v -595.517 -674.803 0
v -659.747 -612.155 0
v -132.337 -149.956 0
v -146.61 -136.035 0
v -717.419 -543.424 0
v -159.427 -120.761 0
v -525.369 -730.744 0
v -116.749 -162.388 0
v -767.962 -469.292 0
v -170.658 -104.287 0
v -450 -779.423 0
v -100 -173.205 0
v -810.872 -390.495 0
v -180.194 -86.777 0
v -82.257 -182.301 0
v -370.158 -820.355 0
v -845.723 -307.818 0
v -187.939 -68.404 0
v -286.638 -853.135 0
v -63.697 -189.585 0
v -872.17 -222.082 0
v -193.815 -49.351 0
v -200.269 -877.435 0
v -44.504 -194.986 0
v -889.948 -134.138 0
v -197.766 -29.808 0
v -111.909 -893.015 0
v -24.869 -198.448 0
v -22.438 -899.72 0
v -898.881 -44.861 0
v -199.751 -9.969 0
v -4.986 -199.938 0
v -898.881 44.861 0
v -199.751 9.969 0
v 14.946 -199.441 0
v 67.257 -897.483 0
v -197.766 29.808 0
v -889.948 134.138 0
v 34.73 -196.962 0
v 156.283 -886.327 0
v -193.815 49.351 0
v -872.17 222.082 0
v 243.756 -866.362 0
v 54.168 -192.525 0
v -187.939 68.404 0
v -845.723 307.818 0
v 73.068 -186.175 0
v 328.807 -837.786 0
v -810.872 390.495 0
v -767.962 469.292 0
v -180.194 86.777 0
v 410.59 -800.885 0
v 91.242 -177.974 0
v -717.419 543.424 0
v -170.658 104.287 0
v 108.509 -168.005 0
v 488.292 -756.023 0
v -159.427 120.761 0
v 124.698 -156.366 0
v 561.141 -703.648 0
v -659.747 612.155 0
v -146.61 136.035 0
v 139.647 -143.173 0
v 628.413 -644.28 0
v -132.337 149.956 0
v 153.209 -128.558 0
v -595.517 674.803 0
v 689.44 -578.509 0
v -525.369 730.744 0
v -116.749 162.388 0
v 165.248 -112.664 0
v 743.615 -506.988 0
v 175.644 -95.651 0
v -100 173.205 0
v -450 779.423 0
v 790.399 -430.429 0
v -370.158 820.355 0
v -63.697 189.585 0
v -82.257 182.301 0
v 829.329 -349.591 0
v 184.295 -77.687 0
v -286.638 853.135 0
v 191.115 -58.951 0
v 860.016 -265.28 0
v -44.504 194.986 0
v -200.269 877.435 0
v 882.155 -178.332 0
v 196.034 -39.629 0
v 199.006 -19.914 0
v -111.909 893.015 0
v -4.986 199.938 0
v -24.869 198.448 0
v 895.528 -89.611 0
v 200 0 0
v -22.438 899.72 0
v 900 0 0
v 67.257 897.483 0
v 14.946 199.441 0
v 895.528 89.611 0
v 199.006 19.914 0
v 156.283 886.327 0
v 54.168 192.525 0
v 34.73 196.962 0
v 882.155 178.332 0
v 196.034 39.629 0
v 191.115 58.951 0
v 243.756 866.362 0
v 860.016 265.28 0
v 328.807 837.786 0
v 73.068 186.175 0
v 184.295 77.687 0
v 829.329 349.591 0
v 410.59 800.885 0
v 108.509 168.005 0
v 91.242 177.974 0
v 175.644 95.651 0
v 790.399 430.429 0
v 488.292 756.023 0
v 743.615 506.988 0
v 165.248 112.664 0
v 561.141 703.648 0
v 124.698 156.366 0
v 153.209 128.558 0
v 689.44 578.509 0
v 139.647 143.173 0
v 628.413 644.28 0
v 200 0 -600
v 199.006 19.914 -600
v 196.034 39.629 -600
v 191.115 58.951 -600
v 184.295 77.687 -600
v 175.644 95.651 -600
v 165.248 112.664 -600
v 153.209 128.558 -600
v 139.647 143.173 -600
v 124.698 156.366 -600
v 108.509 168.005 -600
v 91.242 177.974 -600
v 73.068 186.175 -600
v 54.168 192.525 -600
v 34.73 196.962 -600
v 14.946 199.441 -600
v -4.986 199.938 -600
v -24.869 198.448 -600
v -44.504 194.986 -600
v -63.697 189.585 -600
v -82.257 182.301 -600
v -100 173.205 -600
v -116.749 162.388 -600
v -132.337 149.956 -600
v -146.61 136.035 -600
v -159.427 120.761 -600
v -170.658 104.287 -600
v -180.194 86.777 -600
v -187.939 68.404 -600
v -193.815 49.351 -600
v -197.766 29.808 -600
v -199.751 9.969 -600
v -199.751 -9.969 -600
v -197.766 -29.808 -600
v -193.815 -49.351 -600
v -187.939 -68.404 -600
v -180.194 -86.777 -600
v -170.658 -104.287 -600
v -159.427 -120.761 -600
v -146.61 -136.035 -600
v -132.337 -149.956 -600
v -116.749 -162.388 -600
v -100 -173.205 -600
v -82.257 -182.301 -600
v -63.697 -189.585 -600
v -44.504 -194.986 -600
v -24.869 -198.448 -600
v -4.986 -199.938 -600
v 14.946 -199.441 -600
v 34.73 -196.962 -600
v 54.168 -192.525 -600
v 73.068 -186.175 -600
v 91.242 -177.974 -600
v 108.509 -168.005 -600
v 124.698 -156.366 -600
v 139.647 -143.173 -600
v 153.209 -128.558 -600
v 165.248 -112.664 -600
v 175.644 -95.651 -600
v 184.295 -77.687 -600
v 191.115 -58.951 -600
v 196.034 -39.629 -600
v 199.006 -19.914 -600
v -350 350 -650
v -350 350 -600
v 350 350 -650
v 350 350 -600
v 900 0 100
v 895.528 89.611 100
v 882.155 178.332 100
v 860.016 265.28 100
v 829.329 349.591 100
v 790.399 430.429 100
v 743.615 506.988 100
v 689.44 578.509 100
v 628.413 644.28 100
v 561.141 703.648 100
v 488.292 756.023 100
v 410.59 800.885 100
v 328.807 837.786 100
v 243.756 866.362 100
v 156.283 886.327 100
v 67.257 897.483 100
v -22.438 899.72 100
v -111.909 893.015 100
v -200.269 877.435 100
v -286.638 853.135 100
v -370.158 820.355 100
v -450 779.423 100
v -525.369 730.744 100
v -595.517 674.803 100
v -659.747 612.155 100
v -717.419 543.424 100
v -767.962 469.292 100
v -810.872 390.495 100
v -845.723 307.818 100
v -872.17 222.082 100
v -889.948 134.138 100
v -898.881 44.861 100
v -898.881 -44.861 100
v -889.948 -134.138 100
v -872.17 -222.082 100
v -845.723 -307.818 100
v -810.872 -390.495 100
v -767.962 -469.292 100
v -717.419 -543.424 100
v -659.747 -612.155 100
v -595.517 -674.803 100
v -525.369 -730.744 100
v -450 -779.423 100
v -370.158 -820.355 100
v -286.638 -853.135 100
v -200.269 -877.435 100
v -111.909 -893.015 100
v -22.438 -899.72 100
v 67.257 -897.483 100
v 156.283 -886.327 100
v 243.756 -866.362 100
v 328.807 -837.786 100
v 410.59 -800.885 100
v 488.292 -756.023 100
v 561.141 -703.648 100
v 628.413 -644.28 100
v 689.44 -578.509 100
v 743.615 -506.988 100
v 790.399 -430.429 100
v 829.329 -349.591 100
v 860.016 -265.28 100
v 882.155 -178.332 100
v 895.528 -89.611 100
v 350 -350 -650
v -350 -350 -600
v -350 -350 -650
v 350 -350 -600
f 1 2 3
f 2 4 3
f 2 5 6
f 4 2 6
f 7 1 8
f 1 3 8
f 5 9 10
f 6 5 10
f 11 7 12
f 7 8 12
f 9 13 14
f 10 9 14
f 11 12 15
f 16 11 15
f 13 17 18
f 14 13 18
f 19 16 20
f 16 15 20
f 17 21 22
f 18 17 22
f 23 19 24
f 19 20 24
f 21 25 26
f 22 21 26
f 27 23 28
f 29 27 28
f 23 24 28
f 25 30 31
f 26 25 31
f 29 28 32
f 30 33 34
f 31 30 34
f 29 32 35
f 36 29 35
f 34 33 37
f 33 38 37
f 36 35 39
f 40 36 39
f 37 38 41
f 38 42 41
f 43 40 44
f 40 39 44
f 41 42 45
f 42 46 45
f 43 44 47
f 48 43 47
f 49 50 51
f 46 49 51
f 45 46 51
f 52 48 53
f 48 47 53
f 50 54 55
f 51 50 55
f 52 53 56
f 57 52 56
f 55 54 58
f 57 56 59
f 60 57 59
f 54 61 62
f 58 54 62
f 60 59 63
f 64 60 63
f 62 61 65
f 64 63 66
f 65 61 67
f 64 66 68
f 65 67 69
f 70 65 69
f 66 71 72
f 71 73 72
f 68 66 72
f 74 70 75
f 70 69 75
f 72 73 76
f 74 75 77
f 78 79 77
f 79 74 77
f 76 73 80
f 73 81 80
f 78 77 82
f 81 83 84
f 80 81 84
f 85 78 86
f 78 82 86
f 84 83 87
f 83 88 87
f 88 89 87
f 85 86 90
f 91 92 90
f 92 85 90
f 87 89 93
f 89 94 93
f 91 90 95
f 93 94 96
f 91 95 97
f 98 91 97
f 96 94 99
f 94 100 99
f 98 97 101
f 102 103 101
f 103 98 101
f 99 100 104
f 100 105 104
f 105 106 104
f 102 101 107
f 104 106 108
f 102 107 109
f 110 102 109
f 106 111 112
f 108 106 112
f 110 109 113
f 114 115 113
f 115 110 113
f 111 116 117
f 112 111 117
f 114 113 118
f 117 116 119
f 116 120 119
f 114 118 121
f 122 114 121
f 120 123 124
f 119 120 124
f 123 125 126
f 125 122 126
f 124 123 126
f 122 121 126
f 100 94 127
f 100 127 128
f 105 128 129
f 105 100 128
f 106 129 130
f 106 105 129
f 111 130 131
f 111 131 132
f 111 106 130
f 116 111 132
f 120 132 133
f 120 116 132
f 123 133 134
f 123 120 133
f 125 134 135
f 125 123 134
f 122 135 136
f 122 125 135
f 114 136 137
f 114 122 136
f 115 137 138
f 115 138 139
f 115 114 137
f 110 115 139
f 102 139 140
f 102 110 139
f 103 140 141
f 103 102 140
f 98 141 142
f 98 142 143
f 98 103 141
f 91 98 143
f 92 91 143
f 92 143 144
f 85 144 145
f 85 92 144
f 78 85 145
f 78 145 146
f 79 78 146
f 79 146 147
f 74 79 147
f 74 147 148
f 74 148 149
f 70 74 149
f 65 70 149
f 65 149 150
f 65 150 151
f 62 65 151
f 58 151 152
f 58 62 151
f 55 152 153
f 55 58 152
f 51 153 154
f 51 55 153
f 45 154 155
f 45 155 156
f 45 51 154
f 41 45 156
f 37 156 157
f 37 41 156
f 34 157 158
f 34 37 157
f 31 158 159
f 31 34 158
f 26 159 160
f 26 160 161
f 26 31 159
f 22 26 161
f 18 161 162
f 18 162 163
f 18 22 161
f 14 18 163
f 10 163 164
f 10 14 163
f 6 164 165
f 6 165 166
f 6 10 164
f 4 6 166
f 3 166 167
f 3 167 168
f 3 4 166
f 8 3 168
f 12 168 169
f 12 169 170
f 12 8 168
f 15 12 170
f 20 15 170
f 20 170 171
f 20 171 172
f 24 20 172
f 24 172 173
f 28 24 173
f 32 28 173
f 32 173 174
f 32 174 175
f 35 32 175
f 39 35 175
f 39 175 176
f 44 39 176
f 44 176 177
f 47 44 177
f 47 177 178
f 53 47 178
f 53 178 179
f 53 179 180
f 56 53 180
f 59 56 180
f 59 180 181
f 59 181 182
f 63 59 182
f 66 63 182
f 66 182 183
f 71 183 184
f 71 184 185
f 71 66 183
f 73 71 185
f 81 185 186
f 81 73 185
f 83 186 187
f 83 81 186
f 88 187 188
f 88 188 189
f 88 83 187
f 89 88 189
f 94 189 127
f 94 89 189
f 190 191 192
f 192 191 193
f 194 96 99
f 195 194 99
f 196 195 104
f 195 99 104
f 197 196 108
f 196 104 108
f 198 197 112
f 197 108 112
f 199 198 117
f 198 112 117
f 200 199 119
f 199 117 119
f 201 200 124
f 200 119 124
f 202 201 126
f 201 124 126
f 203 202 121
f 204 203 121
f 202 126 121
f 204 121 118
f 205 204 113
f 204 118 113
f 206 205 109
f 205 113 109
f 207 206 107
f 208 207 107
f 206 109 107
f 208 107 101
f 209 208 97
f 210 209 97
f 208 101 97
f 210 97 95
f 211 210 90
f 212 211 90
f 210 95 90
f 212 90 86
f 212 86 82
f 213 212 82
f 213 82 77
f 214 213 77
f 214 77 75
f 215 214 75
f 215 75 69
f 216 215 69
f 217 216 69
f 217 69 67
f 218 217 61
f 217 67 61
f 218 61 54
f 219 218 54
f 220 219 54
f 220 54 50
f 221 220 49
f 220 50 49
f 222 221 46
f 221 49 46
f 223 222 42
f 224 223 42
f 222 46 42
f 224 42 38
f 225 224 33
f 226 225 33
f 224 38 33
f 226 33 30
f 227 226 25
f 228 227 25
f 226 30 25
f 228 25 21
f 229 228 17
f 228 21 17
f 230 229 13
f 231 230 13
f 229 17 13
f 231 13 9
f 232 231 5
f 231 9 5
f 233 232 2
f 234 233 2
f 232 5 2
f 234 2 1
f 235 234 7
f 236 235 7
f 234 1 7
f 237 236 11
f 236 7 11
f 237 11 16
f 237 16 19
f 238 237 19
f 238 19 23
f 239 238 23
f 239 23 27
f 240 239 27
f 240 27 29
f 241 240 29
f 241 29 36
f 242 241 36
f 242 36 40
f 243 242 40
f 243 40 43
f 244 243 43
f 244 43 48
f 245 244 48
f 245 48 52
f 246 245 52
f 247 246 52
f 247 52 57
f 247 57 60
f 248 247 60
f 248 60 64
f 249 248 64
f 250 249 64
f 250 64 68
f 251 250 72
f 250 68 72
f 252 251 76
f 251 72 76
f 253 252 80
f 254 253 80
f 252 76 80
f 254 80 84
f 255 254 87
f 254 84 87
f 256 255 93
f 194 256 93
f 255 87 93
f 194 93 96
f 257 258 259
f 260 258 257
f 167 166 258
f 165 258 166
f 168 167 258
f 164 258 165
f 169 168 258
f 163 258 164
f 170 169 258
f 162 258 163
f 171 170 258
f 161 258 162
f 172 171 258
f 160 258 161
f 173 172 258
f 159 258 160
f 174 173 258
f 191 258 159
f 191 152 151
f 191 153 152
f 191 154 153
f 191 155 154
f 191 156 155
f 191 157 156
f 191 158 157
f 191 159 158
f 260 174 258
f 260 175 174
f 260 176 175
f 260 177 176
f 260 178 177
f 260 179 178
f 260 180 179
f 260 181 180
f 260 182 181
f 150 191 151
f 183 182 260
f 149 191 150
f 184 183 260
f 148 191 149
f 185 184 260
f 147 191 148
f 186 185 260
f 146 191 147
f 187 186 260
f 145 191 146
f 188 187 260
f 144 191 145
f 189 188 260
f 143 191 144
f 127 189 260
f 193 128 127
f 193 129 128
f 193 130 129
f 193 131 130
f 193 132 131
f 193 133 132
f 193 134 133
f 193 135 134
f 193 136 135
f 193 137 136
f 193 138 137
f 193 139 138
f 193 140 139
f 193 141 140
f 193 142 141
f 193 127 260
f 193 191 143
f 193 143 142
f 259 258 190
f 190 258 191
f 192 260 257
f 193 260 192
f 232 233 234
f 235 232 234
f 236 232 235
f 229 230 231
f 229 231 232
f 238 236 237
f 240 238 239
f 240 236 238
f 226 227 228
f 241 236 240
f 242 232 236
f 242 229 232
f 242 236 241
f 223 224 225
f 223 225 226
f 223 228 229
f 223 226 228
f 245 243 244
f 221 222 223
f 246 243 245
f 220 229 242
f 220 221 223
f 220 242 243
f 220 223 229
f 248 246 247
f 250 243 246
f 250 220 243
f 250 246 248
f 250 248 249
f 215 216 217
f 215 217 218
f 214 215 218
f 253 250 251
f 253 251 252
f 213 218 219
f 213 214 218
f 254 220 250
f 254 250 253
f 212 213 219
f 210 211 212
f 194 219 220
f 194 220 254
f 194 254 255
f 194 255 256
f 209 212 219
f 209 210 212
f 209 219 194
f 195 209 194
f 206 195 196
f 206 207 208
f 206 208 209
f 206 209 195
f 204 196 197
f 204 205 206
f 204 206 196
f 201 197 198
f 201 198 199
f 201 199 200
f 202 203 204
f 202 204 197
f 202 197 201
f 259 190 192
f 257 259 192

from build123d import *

# Parameters (mm, degrees)
F0_R     = 900
F0_W     = 700
F0_H     = 700
F0_R_2   = 200
F1_DEPTH = 100
F2_DEPTH = 600
F3_START = -600
F3_DEPTH = 50


with BuildPart() as f1:
    # F0 (on Top) → F1 (new body)
    with BuildSketch(Plane.XY):
        Circle(F0_R)
        Rectangle(F0_W, F0_H, mode=Mode.SUBTRACT)
        Rectangle(F0_W, F0_H)
        Circle(F0_R_2, mode=Mode.SUBTRACT)
        Circle(F0_R_2)
    extrude(amount=F1_DEPTH)

    # F0 (on Top) → F2 (join)
    with BuildSketch(Plane.XY):
        Circle(F0_R_2)
    extrude(amount=-F2_DEPTH)

    # F0 (on Top) → F3 (join)
    with BuildSketch(Plane.XY.offset(F3_START)):
        Rectangle(F0_W, F0_H)
        Circle(F0_R_2, mode=Mode.SUBTRACT)
        Circle(F0_R_2)
    extrude(amount=-F3_DEPTH)


solid = f1.part
